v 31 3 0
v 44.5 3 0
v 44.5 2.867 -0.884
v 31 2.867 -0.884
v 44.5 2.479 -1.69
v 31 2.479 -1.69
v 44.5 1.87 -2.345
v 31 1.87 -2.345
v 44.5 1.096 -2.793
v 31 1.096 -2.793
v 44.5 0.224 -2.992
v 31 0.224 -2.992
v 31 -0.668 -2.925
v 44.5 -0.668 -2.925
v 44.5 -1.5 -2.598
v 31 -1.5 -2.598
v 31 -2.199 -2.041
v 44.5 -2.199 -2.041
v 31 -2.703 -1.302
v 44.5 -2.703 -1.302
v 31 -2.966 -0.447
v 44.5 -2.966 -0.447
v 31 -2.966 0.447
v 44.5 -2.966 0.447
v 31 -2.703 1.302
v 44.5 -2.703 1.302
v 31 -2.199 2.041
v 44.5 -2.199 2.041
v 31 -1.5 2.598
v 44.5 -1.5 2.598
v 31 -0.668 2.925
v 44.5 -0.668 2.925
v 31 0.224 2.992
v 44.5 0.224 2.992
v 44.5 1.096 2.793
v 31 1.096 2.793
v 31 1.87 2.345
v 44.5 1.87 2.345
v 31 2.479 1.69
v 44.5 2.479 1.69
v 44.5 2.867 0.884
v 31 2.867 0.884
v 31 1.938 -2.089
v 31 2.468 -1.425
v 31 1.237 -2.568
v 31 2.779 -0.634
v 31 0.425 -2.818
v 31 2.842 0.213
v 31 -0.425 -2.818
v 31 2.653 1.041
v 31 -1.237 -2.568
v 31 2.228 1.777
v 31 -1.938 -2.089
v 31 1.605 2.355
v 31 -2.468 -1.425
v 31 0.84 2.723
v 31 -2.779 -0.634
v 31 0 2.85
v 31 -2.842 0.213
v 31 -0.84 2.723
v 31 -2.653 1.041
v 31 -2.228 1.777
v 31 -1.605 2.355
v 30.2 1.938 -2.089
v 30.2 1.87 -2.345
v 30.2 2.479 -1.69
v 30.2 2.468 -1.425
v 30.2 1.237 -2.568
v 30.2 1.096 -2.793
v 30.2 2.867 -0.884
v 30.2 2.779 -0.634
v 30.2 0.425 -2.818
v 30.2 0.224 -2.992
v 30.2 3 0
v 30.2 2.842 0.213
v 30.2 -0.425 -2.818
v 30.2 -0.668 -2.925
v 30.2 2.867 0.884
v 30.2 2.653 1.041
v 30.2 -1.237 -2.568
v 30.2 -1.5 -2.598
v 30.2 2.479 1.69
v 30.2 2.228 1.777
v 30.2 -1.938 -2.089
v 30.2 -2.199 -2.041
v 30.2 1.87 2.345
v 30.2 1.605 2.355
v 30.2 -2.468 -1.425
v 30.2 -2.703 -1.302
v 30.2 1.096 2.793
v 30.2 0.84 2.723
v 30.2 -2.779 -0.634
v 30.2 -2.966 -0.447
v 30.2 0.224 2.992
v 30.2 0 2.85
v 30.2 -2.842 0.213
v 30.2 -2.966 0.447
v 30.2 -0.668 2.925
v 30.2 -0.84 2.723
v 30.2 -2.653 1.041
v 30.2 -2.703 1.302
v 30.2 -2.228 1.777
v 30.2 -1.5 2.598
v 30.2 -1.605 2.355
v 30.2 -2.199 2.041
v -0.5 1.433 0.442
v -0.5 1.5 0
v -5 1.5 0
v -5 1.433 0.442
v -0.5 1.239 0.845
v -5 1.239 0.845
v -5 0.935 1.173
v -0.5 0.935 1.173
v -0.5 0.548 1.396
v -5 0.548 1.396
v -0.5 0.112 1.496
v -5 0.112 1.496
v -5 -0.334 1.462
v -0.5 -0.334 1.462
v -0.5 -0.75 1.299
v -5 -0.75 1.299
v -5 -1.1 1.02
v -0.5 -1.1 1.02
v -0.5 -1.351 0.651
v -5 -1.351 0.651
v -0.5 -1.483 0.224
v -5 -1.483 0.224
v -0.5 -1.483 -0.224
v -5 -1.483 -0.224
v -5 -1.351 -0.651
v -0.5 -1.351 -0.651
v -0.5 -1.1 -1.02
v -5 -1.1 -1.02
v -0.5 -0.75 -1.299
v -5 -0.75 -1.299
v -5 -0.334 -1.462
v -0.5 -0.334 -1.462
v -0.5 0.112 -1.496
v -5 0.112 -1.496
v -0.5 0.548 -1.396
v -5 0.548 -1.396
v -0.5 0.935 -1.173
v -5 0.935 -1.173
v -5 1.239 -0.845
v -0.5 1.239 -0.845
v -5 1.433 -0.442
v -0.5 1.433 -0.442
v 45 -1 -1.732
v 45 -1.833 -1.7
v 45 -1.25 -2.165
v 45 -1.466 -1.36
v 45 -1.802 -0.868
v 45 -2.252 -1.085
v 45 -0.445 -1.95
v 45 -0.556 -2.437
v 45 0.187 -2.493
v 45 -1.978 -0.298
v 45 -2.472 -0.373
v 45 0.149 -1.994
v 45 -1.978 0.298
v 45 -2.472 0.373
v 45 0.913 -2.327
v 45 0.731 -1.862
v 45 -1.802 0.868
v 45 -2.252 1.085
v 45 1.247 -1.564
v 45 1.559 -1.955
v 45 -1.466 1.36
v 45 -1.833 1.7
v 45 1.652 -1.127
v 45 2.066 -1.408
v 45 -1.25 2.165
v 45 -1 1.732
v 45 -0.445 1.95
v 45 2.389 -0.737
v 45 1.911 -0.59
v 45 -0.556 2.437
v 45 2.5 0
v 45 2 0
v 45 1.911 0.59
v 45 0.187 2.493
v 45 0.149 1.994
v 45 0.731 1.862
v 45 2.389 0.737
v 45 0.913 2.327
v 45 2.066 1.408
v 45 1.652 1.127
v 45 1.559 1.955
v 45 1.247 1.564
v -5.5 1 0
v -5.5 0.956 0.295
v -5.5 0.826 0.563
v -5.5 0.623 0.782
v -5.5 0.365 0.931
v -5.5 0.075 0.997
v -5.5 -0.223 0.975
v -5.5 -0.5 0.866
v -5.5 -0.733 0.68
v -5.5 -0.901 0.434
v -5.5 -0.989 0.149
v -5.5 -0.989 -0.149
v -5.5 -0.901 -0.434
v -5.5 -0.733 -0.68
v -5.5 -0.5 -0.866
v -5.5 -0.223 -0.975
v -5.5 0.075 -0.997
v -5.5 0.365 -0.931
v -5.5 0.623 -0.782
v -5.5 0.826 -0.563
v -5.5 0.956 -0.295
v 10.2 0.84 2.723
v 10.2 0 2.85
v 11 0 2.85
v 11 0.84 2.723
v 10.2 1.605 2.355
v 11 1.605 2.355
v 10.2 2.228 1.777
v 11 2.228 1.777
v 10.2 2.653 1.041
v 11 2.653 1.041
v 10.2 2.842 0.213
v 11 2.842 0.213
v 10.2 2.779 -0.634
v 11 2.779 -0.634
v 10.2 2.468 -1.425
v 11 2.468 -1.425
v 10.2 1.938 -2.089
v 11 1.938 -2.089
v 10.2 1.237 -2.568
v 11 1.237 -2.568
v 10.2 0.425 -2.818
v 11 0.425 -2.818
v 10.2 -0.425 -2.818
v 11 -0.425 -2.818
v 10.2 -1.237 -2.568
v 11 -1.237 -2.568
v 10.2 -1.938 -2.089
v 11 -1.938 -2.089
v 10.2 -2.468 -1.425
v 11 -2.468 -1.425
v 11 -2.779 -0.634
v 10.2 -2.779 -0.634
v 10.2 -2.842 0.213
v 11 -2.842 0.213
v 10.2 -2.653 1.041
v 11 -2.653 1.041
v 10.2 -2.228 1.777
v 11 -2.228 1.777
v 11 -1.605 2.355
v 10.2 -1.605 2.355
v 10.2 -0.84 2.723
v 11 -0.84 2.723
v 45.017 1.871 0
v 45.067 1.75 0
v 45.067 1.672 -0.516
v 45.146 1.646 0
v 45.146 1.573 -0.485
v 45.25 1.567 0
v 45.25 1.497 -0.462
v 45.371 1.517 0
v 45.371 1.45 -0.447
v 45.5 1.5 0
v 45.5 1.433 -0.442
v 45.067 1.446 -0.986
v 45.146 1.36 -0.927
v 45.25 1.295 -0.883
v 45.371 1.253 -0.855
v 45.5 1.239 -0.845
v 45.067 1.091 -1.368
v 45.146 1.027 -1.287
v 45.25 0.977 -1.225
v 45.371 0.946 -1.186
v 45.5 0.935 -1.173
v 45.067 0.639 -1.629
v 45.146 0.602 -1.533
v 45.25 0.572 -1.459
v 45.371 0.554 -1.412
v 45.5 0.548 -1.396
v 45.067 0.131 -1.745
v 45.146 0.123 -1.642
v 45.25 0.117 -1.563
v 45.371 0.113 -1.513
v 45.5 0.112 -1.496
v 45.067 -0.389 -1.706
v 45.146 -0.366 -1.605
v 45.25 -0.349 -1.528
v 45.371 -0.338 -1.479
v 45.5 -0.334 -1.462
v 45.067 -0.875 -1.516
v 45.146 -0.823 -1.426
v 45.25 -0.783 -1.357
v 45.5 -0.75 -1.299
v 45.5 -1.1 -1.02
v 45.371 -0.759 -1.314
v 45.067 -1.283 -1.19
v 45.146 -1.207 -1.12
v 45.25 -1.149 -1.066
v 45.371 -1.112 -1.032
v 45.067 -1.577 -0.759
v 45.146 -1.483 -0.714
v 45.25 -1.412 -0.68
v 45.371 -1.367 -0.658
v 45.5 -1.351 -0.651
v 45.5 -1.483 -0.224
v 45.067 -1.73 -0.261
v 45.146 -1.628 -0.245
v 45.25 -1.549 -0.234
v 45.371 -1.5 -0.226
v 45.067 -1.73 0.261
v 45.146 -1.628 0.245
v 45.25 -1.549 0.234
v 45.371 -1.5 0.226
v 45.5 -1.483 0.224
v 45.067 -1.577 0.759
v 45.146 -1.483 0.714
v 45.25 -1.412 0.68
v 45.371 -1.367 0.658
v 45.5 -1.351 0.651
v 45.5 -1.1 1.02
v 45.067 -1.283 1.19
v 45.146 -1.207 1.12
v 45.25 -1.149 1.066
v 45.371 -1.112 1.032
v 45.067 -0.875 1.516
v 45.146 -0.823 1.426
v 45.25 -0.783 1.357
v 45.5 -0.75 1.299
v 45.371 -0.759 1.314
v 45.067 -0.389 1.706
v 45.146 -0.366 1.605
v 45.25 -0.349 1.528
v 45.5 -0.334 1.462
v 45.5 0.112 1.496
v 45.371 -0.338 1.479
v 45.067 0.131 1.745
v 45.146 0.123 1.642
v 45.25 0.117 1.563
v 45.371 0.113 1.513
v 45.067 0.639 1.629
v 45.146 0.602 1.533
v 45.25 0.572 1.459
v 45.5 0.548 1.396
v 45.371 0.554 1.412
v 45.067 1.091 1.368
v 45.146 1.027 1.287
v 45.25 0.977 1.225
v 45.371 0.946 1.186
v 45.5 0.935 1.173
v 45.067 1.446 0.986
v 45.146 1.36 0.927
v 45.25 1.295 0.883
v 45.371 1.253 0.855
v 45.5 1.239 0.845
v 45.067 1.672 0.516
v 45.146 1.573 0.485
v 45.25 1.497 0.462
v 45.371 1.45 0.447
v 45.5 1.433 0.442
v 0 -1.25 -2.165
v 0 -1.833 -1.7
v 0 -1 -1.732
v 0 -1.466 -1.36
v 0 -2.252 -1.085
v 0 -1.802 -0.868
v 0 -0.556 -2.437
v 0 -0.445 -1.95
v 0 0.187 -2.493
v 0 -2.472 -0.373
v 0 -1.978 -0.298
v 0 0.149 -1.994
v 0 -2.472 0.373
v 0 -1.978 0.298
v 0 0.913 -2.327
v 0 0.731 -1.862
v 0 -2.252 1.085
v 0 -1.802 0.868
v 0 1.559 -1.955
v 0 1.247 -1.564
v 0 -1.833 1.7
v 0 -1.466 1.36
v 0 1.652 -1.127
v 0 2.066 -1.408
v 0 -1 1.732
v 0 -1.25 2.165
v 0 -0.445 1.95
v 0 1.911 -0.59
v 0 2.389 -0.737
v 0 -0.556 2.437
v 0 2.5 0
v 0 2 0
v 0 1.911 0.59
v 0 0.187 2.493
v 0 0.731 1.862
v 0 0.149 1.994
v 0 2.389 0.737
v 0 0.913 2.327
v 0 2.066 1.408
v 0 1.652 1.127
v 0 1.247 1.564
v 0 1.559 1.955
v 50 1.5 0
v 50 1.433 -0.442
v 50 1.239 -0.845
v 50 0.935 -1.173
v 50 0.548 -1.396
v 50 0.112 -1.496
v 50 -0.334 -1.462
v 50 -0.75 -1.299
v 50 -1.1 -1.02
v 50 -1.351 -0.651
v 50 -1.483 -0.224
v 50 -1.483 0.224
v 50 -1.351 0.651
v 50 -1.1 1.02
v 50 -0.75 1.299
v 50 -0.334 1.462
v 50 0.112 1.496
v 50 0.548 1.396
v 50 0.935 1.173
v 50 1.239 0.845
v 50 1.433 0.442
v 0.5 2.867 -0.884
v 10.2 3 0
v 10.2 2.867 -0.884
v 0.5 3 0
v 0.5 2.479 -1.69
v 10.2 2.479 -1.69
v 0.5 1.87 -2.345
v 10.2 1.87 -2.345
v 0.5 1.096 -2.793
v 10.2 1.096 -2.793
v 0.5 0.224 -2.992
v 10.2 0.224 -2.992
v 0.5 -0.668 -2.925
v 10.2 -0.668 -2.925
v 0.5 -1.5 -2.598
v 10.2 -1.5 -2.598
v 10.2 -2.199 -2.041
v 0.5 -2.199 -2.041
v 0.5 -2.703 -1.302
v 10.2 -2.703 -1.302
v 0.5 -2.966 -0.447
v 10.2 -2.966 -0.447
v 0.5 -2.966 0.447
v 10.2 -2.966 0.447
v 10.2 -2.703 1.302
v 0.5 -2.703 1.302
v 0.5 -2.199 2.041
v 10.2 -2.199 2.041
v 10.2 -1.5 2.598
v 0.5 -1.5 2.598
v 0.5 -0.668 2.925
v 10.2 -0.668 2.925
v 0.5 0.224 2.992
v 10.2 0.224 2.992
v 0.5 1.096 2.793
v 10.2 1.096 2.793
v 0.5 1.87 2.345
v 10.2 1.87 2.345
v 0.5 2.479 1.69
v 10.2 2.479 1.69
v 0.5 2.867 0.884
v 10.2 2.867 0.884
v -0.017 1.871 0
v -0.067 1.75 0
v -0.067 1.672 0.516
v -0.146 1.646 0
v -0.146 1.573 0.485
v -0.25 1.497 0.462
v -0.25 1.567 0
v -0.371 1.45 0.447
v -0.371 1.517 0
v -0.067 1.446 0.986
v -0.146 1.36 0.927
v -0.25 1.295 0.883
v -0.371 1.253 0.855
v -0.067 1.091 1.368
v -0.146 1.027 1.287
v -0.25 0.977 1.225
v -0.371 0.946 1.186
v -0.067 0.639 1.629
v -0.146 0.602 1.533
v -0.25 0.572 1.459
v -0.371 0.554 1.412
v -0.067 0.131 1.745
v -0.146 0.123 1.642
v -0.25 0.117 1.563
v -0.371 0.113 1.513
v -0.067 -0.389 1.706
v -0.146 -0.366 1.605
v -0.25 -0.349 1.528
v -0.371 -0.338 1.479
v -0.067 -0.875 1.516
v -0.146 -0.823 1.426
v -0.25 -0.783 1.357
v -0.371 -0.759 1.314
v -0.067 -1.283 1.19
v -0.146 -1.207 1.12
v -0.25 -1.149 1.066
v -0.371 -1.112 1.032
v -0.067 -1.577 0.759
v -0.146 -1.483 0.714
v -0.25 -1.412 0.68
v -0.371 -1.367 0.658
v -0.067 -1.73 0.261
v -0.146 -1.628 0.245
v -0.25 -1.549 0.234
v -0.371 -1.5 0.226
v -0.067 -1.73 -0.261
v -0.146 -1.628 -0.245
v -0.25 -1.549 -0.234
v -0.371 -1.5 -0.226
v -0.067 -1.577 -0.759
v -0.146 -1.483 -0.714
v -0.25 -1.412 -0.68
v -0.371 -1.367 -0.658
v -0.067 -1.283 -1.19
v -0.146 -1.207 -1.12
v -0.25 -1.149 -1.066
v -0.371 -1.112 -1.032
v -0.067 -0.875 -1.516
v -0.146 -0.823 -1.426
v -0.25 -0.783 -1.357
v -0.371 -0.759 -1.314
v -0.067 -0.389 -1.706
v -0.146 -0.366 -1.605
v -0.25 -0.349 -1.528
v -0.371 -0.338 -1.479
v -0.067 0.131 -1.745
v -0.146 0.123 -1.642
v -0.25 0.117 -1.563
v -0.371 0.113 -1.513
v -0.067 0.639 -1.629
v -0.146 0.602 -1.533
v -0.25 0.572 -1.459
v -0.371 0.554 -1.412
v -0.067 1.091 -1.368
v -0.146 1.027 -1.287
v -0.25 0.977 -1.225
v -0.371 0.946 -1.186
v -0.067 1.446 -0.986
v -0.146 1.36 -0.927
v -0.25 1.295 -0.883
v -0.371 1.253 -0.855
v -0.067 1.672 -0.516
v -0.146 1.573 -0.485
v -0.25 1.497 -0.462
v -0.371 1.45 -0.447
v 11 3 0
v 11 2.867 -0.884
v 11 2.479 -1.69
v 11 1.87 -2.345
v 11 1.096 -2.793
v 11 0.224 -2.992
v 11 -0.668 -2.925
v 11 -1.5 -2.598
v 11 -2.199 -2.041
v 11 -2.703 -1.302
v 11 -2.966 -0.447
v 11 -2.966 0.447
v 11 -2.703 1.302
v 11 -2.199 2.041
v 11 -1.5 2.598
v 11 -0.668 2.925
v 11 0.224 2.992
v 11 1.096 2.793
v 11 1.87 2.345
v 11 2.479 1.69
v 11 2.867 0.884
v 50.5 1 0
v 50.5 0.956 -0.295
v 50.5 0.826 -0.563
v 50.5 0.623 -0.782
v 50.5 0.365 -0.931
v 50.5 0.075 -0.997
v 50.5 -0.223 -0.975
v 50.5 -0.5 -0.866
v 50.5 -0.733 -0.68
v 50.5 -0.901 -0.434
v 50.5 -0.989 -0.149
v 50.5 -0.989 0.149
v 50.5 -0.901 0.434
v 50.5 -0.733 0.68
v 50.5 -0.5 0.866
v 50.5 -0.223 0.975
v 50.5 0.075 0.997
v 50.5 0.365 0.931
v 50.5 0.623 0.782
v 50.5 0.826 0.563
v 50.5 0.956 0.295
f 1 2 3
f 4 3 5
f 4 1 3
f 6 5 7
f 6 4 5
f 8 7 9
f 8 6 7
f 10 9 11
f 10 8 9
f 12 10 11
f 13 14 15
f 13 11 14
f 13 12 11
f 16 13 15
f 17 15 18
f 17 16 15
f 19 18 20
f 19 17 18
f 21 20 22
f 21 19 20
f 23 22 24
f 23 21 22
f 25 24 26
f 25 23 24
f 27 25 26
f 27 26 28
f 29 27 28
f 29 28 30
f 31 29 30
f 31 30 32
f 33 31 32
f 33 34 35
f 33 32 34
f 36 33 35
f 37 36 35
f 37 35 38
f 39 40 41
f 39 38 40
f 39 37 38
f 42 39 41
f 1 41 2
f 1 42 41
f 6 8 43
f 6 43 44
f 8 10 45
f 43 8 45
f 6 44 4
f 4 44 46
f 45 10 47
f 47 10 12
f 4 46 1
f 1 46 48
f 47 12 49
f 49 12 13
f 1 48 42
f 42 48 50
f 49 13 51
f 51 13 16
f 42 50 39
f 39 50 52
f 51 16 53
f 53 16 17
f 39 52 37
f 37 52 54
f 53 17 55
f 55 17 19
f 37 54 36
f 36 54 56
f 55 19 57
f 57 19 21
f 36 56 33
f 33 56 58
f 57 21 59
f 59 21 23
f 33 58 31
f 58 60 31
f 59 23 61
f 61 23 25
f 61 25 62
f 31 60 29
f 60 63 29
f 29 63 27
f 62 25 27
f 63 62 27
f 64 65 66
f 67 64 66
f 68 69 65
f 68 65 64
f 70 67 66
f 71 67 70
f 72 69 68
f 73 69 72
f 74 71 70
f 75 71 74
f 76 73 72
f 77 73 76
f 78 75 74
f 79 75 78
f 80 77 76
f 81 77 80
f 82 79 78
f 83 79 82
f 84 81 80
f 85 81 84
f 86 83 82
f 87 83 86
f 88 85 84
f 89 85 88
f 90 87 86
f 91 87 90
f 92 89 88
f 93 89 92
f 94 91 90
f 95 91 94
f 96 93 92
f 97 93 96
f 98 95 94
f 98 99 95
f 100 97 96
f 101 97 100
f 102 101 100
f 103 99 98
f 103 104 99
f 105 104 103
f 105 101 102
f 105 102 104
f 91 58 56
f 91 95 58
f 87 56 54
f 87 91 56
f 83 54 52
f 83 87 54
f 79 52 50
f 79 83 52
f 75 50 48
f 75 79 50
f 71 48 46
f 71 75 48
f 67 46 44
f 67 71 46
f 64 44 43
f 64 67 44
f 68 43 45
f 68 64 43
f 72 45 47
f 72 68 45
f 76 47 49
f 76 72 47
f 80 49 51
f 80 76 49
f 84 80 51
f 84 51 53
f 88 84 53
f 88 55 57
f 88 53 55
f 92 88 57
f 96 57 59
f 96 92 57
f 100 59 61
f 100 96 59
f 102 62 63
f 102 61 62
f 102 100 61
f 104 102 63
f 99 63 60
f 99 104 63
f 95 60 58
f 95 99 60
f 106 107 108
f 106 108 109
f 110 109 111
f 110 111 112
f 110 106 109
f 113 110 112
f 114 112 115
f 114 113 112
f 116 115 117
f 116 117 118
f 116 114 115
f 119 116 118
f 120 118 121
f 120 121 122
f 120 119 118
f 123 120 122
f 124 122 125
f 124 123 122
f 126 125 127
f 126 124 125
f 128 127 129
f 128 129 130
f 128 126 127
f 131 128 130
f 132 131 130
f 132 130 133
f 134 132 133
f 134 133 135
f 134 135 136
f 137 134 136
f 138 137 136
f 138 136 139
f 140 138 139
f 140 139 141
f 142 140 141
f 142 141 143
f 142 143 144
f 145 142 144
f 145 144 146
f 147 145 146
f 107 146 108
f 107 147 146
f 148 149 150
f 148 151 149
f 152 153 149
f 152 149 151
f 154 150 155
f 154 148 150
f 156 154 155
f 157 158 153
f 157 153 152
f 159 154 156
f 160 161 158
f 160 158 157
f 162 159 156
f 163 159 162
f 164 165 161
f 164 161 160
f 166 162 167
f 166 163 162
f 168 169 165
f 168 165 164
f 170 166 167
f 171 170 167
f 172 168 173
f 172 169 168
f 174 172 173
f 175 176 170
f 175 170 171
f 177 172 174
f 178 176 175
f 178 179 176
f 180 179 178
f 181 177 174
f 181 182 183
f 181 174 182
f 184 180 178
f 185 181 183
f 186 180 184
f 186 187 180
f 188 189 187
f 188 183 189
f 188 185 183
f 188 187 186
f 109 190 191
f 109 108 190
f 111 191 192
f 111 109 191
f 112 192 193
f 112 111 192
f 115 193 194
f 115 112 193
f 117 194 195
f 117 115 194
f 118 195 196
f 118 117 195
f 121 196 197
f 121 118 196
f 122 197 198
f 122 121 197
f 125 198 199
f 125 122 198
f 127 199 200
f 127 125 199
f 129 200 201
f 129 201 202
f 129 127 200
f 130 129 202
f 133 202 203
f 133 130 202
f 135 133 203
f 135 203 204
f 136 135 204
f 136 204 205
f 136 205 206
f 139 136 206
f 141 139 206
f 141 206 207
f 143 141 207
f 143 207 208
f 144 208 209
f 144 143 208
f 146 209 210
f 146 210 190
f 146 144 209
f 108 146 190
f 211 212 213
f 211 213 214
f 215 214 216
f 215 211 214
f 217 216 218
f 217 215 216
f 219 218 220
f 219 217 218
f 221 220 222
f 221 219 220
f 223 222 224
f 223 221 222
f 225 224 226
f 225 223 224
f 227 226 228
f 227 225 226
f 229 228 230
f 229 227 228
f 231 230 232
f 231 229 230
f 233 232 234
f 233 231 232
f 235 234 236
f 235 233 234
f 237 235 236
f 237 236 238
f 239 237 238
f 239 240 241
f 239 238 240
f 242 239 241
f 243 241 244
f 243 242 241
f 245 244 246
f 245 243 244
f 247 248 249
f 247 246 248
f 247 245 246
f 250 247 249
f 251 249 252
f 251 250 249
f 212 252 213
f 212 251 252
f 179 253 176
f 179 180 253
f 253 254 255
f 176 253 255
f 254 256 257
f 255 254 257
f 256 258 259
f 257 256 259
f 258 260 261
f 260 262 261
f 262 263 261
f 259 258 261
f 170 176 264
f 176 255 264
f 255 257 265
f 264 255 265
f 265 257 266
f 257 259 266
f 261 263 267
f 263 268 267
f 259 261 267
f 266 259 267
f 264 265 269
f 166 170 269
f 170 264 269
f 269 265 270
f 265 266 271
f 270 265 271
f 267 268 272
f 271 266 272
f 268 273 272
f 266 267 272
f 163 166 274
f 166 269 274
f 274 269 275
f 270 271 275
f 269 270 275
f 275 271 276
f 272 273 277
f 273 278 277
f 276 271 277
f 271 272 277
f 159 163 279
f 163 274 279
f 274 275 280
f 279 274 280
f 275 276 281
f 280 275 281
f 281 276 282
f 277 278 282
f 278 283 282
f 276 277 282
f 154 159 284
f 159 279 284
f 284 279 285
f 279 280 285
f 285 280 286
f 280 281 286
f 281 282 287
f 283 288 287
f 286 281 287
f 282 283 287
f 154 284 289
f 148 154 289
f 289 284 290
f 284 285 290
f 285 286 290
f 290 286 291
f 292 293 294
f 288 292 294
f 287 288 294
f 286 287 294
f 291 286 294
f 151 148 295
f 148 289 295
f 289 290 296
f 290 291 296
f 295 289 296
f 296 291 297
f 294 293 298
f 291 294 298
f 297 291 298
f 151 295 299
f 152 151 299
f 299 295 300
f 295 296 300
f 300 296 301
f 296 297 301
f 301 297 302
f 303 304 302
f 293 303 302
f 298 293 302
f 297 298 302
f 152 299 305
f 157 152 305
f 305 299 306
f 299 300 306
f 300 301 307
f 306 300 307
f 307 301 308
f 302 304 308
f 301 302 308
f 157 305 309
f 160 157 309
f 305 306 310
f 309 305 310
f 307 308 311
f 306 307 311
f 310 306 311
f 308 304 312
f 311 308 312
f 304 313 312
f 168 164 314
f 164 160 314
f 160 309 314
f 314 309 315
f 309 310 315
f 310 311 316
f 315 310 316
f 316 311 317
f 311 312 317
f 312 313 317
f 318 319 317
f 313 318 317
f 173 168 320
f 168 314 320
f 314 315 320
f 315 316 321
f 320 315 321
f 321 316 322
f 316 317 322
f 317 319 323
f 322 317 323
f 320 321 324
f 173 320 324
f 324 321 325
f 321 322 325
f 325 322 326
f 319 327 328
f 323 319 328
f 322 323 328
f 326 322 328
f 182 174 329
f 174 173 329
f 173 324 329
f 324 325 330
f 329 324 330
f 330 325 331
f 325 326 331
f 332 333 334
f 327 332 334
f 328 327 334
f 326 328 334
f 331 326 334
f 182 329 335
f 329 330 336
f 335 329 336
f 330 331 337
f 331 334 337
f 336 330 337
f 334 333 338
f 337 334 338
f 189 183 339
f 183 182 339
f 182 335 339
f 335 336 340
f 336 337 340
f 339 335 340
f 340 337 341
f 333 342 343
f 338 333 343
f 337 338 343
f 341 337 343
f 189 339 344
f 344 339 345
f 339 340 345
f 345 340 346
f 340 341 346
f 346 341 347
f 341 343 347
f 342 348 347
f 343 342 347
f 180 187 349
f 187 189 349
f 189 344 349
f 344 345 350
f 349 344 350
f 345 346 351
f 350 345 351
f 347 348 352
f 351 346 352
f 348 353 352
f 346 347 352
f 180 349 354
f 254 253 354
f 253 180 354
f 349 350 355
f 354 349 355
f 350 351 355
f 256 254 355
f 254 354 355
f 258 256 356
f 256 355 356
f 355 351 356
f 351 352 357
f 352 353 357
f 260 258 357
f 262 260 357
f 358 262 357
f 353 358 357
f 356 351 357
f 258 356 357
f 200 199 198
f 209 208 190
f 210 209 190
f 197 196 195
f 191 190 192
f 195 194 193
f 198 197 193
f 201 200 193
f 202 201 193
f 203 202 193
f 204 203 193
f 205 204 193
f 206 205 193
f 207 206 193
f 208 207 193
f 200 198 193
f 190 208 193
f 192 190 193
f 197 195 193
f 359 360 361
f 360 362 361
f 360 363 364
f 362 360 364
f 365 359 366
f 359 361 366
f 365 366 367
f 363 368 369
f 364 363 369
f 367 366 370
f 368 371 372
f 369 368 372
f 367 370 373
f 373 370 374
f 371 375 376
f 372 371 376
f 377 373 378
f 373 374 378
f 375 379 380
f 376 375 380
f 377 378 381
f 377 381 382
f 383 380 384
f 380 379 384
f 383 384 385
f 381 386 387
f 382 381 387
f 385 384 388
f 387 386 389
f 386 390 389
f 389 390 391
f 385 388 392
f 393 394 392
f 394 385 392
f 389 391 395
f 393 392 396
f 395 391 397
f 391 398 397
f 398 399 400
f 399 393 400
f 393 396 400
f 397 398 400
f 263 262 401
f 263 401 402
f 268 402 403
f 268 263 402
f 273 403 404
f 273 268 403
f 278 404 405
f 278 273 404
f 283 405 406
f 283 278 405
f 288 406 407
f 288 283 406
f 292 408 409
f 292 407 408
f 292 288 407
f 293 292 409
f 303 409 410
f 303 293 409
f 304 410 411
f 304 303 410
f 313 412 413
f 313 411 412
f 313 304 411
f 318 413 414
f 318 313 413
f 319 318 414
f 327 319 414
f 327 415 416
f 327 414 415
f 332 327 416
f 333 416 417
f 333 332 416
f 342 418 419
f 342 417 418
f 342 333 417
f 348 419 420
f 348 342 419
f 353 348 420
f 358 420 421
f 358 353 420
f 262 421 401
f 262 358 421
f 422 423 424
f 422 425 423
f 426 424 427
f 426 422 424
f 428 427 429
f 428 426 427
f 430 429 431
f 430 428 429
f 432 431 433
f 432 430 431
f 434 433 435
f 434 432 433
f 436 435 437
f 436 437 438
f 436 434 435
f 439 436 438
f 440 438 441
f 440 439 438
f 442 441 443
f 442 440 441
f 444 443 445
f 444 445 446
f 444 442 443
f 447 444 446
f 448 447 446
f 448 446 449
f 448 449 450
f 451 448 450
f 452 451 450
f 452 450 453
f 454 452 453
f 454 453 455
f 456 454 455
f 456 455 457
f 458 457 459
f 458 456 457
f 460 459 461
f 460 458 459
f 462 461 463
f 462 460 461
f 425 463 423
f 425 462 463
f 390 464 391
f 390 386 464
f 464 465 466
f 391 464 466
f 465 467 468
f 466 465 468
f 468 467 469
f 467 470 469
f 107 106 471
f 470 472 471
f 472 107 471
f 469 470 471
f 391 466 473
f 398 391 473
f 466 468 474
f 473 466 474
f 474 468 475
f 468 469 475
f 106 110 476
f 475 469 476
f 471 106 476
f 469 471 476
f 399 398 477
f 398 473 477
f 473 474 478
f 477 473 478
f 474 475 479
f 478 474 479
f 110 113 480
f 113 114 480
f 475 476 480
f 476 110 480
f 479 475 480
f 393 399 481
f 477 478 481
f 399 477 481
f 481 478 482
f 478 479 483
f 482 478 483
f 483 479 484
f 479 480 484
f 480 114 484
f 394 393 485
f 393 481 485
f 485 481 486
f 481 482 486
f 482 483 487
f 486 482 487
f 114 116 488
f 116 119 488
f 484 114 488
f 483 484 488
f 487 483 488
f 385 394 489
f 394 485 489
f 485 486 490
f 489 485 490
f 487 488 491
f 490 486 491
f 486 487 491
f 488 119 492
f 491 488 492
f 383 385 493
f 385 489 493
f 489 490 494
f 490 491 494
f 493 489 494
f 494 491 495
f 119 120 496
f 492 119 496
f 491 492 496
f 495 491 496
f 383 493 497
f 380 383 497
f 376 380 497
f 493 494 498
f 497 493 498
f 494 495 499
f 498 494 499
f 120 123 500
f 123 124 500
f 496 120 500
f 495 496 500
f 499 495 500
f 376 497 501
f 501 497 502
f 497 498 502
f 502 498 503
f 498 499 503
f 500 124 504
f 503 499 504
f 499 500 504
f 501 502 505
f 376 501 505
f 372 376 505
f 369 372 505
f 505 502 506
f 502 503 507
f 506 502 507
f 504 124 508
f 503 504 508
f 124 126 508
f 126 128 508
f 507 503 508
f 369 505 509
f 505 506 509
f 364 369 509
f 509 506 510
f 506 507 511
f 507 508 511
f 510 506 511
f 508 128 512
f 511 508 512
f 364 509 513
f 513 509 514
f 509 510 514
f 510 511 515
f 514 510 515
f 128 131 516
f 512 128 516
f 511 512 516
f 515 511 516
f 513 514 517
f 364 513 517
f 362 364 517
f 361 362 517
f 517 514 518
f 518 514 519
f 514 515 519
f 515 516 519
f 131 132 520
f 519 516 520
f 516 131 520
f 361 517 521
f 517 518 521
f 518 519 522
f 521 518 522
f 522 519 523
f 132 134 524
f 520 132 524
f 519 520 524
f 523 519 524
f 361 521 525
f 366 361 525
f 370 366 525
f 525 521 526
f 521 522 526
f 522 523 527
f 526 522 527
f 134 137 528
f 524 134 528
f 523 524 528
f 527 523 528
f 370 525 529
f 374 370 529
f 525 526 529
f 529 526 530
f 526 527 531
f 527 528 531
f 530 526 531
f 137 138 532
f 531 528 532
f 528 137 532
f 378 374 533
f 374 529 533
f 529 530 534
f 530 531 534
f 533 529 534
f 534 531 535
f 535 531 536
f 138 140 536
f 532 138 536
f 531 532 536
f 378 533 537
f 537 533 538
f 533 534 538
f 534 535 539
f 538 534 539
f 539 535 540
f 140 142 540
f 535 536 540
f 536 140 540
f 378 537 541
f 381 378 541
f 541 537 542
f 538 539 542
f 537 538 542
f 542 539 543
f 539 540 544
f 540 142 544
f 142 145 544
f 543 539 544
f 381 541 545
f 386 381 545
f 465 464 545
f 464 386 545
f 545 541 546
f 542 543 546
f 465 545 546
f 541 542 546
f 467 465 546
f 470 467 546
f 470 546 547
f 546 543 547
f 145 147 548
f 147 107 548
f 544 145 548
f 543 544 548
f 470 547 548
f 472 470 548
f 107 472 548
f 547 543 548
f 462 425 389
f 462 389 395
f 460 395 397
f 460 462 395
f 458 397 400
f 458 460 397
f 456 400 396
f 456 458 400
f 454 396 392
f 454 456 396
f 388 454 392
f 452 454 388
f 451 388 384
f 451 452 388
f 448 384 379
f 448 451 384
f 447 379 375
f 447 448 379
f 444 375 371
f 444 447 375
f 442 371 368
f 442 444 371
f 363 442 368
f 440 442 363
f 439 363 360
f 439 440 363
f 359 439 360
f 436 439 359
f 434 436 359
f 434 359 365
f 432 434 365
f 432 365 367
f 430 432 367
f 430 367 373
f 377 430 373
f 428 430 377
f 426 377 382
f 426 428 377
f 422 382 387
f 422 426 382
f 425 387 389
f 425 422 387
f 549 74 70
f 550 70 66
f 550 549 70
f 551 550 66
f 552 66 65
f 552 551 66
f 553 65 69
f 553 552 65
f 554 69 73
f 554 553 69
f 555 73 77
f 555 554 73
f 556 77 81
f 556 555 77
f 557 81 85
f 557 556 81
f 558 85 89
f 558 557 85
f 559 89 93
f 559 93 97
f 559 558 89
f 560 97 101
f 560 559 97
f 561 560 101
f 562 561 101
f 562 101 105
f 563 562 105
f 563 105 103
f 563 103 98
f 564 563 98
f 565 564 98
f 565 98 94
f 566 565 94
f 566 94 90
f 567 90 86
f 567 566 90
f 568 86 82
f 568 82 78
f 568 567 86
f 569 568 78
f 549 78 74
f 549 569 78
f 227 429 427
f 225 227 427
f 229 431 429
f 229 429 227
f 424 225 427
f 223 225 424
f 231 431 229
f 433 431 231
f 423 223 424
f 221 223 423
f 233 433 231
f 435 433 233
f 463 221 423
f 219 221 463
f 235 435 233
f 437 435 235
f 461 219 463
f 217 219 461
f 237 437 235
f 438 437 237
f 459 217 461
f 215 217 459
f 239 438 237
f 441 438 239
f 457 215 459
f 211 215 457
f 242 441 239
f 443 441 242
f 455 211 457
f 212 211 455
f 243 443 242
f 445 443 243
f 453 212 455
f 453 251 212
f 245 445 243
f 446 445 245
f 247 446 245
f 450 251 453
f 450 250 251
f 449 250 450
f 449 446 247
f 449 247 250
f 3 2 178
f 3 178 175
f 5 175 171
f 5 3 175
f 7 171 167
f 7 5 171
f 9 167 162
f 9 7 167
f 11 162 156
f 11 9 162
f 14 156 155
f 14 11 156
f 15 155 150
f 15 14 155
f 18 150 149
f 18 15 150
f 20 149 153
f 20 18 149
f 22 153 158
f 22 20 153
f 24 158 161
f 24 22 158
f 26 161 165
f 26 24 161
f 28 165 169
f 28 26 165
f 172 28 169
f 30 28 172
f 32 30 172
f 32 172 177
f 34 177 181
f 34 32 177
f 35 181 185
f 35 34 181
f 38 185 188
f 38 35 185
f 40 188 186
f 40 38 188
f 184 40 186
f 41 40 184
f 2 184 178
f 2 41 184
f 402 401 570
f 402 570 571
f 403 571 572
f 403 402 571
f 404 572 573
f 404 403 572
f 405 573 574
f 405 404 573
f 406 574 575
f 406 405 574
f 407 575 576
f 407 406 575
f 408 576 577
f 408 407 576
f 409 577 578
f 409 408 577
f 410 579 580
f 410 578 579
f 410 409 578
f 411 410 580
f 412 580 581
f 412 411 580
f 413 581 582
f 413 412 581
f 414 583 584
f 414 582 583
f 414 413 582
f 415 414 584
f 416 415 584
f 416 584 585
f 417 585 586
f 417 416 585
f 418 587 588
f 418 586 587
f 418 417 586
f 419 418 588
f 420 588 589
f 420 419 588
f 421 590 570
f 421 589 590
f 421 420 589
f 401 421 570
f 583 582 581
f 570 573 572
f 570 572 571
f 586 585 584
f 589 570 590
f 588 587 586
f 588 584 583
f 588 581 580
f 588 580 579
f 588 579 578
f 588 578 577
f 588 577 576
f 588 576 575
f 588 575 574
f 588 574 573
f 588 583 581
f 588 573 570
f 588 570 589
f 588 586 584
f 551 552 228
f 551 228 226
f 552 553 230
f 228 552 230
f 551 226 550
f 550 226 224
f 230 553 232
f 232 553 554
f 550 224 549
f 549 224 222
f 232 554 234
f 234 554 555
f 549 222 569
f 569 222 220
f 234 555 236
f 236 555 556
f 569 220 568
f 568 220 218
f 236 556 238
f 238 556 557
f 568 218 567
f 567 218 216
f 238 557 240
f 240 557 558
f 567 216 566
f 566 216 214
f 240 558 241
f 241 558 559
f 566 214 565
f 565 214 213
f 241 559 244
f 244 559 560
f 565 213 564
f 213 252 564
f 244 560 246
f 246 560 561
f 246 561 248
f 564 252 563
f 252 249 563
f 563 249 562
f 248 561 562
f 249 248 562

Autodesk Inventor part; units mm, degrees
ref_plane "YZ Plane" through (0, 0, 0) normal (1, 0, 0) x (0, 1, 0)
ref_plane "XZ Plane" through (0, 0, 0) normal (0, 1, 0) x (-1, 0, 0)
ref_plane "XY Plane" through (0, 0, 0) normal (0, 0, 1) x (1, 0, 0)
sketch "Sketch1" plane through (0, 0, 0) normal (0, 0, 1) x (1, 0, 0)
  line L0 (0, 0) -> (45, 0)
  line L1 (45, 0) -> (45, 3)
  line L2 (45, 3) -> (0, 3)
  line L3 (0, 3) -> (0, 0)
  line L4 (0, 0) -> (-5.5, 0)
  line L5 (-5.5, 0) -> (-5.5, 1.5)
  line L6 (-5.5, 1.5) -> (0, 1.5)
  line L7 (0, 1.5) -> (0, 0)
  line L8 (45, 0) -> (50.5, 0)
  line L9 (50.5, 0) -> (50.5, 1.5)
  line L10 (50.5, 1.5) -> (45, 1.5)
  line L11 (45, 1.5) -> (45, 0)
  dimension "d0" = 3
  dimension "d1" = 45
  dimension "d2" = 1.5
  dimension "d3" = 5.5
  dimension "d4" = 1.5
  dimension "d5" = 5.5
revolve "Revolution1" add sketch "Sketch1" angle 360 about axis through (0, 0, 0) along (1, 0, 0)
fillet "Fillet1" radius 0.5 2 edges at (45, -1.5, 0) (0, -1.5, 0)
chamfer "Chamfer1" distance 0.5 angle 45 4 edges at (-5.5, -1.5, 0) (0, -3, 0) (45, -3, 0) (50.5, -1.5, 0)
sketch "Sketch2" plane through (0, 0, 0) normal (0, 1, 0) x (-1, 0, 0)
  line L0 (-10.2, 3) -> (-11, 3)
  line L1 (-11, 3) -> (-11, 2.85)
  line L2 (-11, 2.85) -> (-10.2, 2.85)
  line L3 (-10.2, 2.85) -> (-10.2, 3)
  line L4 (-0.5, -3) -> (-0.5, 3) projected
  line L5 (-44.5, 3) -> (-44.5, -3) projected
  line L6 (6.7, 0) -> (-40.2, 0) projected
  line L7 (0, 2.5) -> (0, -2.5) projected
  line L8 (-30.2, 3) -> (-31, 3)
  line L9 (-31, 3) -> (-31, 2.85)
  line L10 (-31, 2.85) -> (-30.2, 2.85)
  line L11 (-30.2, 2.85) -> (-30.2, 3)
  line L12 (-45, -2.5) -> (-45, 2.5) projected
  point P0 (0, 0)
  dimension "d11" = 2.85
  dimension "d12" = 0.8
  dimension "d15" = 0.8
  dimension "d17" = 20
  dimension "d19" = 14
  dimension "d20" = 11
revolve "Revolution2" cut sketch "Sketch2" angle 360 about axis through (-10, 0, 0) along (1, 0, 0)
equation "\"d4\" = d2"
equation "\"d15\" = d12"
properties part number "Top_Separator Shaft" material "Aluminum 6061"
